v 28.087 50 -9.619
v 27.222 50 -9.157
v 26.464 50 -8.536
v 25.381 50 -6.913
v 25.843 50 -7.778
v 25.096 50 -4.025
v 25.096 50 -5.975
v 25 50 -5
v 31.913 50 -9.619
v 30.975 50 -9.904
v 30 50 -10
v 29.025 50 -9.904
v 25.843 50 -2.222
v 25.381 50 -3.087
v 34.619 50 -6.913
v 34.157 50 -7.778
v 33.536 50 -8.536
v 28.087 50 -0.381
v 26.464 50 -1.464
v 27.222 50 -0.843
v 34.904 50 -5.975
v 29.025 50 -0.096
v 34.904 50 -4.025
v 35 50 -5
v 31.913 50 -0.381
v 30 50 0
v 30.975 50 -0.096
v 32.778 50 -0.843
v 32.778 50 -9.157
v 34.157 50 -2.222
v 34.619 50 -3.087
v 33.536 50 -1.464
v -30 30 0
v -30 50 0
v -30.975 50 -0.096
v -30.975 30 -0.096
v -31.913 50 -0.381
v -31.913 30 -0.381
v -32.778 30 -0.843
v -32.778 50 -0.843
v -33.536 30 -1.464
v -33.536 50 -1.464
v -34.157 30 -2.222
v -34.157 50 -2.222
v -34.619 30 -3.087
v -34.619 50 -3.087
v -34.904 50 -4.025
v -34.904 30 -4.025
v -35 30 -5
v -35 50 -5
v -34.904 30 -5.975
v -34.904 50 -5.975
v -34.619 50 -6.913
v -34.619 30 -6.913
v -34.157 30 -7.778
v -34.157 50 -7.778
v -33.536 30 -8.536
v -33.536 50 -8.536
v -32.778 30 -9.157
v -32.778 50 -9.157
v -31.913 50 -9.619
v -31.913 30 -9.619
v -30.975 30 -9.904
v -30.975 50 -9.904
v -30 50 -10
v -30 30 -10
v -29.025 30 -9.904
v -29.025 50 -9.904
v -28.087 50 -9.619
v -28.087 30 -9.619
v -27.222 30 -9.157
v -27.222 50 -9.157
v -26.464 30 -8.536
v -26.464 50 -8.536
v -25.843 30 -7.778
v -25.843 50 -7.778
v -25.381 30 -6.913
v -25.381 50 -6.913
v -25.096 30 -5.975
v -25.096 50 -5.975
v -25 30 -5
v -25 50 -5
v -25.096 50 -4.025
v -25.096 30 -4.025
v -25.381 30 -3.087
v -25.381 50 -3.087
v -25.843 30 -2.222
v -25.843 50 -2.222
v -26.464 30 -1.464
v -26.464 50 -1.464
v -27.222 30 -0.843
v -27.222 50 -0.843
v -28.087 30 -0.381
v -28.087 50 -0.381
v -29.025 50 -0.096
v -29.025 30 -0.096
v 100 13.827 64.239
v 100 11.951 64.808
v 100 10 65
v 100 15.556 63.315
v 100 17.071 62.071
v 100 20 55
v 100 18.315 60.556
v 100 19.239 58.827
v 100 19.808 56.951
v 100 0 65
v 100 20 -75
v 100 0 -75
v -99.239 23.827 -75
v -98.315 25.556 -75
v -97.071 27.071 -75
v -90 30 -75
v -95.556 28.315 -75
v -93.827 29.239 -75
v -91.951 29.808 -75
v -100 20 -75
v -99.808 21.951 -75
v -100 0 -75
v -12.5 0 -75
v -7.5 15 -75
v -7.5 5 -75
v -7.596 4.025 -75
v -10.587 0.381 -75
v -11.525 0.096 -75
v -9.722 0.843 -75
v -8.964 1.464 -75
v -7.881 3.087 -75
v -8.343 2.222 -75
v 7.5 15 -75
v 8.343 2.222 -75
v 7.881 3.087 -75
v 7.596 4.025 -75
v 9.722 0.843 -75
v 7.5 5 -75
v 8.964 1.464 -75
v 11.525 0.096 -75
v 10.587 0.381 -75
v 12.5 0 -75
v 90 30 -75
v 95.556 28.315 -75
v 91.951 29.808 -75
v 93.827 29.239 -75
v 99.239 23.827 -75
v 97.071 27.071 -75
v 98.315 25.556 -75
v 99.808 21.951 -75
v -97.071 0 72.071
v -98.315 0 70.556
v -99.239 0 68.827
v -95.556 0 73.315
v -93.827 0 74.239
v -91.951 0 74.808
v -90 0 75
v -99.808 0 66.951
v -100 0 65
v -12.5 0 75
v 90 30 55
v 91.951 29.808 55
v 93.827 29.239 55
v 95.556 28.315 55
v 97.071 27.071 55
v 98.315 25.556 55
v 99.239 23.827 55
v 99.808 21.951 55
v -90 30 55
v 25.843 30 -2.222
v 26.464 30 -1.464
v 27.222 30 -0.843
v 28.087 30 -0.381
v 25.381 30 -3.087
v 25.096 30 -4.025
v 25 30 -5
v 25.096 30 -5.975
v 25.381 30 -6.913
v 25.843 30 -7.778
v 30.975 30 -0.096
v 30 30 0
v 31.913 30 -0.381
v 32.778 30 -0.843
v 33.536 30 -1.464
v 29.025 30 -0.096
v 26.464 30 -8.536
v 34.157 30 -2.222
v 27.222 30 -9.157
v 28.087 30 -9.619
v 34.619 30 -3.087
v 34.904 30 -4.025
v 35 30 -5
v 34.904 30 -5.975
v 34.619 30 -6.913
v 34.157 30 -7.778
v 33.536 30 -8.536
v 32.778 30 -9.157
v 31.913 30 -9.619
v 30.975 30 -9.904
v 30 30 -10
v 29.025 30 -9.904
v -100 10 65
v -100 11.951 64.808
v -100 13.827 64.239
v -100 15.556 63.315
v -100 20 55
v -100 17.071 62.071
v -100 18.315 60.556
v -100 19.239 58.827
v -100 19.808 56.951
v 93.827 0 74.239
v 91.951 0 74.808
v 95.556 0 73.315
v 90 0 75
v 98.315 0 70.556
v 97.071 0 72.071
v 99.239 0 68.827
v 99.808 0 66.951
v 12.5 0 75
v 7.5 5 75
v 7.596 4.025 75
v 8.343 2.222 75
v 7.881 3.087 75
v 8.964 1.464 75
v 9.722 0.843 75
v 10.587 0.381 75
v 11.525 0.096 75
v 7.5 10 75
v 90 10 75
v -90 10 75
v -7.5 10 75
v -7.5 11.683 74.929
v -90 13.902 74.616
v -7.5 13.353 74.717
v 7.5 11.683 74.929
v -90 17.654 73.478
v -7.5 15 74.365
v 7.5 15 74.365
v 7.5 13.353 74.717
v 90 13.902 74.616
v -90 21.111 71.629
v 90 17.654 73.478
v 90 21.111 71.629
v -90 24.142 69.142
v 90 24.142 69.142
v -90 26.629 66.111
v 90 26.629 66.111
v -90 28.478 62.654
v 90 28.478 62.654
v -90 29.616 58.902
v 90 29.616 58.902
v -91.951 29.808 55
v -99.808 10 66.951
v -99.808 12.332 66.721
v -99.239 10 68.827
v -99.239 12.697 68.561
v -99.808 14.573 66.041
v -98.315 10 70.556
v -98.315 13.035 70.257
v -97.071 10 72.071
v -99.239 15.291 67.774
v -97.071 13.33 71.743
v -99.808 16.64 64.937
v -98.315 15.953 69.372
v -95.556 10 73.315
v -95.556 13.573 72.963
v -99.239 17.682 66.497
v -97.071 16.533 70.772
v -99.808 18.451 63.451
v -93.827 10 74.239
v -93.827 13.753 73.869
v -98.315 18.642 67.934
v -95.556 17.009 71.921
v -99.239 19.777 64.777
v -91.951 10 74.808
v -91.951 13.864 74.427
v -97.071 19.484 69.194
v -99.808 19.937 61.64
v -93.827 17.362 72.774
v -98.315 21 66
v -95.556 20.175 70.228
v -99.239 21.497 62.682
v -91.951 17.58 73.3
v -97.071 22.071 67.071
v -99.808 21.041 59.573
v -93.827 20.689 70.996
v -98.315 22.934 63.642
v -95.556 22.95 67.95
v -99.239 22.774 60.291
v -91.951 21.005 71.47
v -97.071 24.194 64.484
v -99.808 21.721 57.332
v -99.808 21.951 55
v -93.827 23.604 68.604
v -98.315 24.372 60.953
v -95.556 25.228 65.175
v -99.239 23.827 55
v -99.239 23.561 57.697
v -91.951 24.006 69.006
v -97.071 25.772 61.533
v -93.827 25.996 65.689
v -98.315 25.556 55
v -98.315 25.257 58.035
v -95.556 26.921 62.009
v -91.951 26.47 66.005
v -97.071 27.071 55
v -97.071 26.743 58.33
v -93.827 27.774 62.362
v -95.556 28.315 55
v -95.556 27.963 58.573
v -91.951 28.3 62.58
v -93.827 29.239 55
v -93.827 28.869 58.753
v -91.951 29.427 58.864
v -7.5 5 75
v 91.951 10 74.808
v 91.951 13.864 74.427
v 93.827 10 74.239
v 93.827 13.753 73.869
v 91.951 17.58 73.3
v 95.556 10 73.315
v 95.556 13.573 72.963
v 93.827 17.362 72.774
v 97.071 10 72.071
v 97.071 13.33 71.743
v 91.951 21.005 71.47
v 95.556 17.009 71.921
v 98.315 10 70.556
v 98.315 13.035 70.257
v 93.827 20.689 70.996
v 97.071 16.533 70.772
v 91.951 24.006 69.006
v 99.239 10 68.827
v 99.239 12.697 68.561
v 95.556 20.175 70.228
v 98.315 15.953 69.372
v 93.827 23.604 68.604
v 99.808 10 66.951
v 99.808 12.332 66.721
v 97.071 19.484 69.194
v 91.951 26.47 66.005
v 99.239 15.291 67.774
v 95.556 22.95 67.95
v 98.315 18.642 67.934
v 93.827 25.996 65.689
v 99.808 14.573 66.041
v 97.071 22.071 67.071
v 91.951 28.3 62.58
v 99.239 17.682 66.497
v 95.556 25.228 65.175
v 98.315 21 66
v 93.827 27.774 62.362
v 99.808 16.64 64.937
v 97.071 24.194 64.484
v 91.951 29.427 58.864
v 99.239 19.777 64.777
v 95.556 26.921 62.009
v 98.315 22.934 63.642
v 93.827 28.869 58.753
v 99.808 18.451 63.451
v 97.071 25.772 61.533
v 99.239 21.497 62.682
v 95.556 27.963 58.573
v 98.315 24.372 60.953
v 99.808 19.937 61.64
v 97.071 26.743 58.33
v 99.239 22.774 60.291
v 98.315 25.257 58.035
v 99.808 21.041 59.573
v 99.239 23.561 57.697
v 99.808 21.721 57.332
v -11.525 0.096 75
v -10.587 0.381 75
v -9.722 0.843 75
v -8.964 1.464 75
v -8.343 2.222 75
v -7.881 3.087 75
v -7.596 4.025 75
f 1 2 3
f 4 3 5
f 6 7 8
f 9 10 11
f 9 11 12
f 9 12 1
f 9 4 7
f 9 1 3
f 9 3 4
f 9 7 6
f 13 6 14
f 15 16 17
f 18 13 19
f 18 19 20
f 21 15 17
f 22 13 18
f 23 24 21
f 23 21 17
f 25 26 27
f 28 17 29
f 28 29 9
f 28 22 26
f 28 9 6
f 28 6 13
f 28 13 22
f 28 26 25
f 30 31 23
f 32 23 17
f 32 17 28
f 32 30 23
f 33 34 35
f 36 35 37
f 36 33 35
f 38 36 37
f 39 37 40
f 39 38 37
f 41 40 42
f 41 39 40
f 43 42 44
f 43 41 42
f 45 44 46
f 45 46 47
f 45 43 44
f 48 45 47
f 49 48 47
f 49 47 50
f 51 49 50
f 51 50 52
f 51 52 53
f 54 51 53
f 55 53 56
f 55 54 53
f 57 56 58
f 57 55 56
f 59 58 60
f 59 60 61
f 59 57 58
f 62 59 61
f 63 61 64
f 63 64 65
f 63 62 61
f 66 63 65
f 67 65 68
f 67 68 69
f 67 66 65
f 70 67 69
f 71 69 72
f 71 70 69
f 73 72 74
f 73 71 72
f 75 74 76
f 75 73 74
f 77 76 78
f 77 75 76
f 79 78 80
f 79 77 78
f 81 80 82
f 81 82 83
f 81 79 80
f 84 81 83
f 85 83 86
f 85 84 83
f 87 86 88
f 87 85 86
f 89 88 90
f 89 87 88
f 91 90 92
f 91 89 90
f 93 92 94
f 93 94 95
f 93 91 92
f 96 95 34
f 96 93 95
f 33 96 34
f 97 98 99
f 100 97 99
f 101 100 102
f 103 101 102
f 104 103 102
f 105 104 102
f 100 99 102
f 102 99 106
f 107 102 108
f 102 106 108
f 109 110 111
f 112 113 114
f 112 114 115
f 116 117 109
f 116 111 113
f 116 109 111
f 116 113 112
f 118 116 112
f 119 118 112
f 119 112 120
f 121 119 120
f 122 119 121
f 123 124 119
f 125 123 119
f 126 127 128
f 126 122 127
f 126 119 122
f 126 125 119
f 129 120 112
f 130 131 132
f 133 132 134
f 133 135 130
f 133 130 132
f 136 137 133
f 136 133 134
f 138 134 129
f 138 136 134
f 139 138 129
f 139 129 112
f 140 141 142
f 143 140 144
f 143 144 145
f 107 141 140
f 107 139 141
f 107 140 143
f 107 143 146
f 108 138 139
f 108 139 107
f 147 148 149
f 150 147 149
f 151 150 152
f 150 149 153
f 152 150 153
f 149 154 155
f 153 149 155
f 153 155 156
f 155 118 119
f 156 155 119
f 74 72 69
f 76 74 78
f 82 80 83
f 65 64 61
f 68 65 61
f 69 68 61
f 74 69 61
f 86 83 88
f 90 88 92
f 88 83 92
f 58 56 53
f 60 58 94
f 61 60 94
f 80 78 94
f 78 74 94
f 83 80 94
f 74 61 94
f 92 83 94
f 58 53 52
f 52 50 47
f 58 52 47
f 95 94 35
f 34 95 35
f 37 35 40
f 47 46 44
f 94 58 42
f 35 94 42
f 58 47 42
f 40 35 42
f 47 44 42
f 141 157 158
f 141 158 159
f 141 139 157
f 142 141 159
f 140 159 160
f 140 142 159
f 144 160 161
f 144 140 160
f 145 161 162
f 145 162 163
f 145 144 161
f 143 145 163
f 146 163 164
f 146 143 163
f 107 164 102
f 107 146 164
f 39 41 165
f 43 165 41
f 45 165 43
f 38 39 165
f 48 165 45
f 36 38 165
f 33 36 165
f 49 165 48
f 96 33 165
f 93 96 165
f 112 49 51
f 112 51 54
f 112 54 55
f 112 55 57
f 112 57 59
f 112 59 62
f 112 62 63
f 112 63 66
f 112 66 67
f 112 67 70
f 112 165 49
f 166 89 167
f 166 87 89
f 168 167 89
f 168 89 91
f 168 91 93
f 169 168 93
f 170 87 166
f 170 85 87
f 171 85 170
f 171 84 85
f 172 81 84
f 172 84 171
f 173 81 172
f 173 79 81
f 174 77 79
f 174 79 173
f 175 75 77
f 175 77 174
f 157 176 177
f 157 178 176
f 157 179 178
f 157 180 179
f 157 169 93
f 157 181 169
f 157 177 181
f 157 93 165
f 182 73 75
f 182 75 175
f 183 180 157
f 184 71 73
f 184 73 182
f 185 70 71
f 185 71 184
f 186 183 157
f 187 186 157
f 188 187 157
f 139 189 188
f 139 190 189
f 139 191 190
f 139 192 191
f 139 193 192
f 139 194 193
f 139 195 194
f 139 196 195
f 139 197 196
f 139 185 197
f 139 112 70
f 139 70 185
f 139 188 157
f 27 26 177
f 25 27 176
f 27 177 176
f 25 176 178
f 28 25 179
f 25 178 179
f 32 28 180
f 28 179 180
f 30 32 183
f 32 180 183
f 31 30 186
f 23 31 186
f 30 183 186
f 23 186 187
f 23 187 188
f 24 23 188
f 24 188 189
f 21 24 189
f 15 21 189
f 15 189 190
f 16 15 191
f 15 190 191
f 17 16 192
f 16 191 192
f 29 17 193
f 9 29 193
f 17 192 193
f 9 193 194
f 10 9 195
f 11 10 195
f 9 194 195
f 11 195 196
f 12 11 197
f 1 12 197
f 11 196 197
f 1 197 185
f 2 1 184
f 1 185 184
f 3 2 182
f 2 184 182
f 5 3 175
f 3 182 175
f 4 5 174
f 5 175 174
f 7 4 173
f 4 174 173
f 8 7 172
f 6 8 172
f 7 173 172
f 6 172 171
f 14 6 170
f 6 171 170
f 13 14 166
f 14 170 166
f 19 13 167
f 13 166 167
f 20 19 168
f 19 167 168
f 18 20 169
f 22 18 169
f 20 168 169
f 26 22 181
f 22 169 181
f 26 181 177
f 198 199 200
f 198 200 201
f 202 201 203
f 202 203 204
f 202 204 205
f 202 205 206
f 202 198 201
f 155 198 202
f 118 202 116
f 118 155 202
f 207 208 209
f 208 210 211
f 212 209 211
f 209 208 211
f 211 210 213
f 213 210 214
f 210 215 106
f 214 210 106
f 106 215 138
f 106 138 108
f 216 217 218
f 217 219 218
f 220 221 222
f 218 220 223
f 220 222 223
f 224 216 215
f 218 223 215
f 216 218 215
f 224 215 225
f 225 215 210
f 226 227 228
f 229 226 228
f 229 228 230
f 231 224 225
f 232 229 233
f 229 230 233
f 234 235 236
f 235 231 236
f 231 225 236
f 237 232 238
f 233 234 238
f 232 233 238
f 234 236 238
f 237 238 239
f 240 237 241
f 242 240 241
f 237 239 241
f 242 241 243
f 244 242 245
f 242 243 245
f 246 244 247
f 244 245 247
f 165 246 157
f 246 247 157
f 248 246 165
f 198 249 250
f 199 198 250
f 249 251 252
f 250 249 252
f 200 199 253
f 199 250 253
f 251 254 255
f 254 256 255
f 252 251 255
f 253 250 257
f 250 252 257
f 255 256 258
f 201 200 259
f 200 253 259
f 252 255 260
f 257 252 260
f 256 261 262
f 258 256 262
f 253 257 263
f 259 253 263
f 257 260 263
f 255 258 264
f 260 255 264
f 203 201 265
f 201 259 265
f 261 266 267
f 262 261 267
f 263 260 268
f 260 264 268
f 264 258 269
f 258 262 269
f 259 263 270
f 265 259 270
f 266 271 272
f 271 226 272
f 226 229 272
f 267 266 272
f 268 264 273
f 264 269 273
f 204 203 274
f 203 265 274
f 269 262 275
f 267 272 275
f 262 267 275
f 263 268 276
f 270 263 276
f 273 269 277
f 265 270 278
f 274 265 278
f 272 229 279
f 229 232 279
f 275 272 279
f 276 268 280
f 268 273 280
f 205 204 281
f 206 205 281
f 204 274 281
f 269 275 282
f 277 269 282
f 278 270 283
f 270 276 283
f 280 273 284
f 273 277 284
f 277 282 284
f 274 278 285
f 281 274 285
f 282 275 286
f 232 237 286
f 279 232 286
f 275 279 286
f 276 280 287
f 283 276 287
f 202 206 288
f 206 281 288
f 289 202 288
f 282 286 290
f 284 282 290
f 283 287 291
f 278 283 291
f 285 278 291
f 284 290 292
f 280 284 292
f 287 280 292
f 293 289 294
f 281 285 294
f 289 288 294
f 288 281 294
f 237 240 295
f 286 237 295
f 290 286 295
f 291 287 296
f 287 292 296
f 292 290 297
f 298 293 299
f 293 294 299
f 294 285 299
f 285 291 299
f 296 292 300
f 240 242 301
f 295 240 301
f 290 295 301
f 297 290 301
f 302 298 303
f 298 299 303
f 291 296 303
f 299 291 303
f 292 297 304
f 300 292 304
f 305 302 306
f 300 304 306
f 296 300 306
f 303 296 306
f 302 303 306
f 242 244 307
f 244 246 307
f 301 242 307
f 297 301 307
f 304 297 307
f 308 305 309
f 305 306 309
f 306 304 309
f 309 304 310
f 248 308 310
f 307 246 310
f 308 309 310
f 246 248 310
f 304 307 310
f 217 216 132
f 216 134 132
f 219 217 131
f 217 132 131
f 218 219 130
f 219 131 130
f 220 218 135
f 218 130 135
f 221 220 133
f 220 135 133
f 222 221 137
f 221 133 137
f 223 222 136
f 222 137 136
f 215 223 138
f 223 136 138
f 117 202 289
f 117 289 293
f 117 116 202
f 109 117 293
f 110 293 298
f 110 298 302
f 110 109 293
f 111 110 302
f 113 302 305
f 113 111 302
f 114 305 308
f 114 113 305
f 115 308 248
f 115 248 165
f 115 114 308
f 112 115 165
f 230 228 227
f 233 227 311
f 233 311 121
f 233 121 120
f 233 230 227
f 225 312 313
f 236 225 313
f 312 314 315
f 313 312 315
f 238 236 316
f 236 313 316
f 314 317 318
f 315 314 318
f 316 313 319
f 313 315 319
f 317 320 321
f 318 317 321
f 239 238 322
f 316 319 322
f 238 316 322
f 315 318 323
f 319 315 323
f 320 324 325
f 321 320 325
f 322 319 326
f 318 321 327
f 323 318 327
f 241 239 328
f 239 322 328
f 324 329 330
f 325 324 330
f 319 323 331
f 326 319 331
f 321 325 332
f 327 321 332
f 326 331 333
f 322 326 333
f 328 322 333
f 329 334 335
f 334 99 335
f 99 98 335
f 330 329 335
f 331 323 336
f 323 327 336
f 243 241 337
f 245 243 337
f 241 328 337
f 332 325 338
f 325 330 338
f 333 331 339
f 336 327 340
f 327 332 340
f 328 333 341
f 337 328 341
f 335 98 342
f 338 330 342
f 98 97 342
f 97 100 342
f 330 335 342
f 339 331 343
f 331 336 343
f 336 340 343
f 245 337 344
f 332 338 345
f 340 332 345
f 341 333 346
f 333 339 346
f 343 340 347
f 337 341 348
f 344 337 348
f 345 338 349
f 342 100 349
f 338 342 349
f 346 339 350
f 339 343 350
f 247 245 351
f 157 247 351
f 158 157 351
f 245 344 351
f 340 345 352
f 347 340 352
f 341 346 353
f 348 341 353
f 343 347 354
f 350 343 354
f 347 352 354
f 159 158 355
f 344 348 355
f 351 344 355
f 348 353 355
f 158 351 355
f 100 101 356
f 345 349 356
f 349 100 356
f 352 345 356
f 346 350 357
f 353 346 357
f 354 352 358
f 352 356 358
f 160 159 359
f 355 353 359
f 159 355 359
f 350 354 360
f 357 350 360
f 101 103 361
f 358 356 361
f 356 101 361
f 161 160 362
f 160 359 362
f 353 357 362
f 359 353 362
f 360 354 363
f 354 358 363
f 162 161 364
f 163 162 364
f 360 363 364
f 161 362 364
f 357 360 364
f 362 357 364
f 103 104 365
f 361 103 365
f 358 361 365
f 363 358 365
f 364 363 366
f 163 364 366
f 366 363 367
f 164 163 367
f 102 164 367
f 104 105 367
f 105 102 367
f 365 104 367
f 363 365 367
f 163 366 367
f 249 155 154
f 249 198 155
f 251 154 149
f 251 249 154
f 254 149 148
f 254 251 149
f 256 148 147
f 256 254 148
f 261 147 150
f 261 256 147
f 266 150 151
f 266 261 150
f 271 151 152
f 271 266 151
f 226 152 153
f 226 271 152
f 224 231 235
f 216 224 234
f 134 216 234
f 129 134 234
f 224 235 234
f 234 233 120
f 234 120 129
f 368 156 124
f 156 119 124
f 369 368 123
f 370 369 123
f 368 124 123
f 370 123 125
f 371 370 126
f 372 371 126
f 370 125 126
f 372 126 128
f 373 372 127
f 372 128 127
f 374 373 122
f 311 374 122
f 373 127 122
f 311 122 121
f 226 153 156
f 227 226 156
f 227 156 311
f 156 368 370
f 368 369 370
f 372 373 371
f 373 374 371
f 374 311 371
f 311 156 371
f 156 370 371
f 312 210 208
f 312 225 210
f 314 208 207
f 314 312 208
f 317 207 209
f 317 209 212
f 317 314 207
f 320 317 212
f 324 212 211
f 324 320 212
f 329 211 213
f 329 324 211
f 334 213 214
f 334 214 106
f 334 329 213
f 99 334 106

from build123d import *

# Parameters (mm, degrees)
SKETCH1_W           = 200
SKETCH1_H           = 150
BOSS_EXTRUDE1_DEPTH = 30
FILLET1_R           = 20
FILLET2_R           = 10
SKETCH2_W           = 15
SKETCH2_H           = 15
CUT_EXTRUDE1_DEPTH  = 183.756668825
FILLET4_R           = 5
SKETCH3_R           = 5
BOSS_EXTRUDE2_DEPTH = 20


with BuildPart() as part:
    # Sketch1 → Boss-Extrude1 (new body)
    with BuildSketch(Plane(origin=(0, 0, 0), x_dir=(1, 0, 0), z_dir=(0, 1, 0))):
        Rectangle(SKETCH1_W, SKETCH1_H)
    extrude(amount=BOSS_EXTRUDE1_DEPTH)

    # Fillet1
    fillet1_edges = [part.edges().sort_by_distance(p)[0] for p in [
        (0, 30, 75),
    ]]
    fillet(fillet1_edges, radius=FILLET1_R)

    # Fillet2
    fillet2_edges = [part.edges().sort_by_distance(p)[0] for p in [
        (100, 30, -10),
        (100, 5, 75),
        (100, 24.142135624, 69.142135624),
        (-100, 5, 75),
        (-100, 24.142135624, 69.142135624),
        (-100, 30, -10),
    ]]
    fillet(fillet2_edges, radius=FILLET2_R)

    # Sketch2 → Cut-Extrude1 (cut, through all)
    with BuildSketch(Plane.XY.offset(75)):
        with Locations((0, 7.5)):
            Rectangle(SKETCH2_W, SKETCH2_H)
    extrude(amount=-CUT_EXTRUDE1_DEPTH, mode=Mode.SUBTRACT)

    # Fillet4
    fillet4_edges = [part.edges().sort_by_distance(p)[0] for p in [
        (-7.5, 0, 0),
        (7.5, 0, 0),
    ]]
    fillet(fillet4_edges, radius=FILLET4_R)

    # Sketch3 → Boss-Extrude2 (add)
    with BuildSketch(Plane(origin=(0, 30, 0), x_dir=(1, 0, 0), z_dir=(0, 1, 0))):
        with Locations(Location((30, 5, 0), (0, 0, 270))):
            Circle(SKETCH3_R)
    boss_extrude2 = extrude(amount=BOSS_EXTRUDE2_DEPTH)

    # Mirror1: Boss-Extrude2 across plane
    add(boss_extrude2.mirror(Plane(origin=(0, 0, 0), x_dir=(0, 0, 1), z_dir=(1, 0, 0))))


solid = part.part
